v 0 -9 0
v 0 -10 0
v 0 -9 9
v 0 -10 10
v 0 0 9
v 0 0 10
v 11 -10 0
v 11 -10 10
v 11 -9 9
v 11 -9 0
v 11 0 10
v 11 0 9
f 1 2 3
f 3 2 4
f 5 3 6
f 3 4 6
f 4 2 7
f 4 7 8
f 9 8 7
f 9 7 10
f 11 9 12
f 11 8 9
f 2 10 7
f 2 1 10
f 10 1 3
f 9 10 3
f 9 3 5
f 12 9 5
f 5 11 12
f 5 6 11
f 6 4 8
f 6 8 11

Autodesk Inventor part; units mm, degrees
ref_plane "YZ Plane" through (0, 0, 0) normal (1, 0, 0) x (0, 1, 0)
ref_plane "XZ Plane" through (0, 0, 0) normal (0, 1, 0) x (-1, 0, 0)
ref_plane "XY Plane" through (0, 0, 0) normal (0, 0, 1) x (1, 0, 0)
sketch "Sketch1" plane through (0, 0, 0) normal (1, 0, 0) x (0, 1, 0)
  line L0 (0, 0) -> (-10, 0)
  line L1 (-10, 0) -> (-10, 10)
  line L2 (-10, 10) -> (0, 10)
  line L3 (0, 10) -> (0, 0)
  line L4 (-9, 9) -> (0, 9)
  line L5 (0, 9) -> (0, 0)
  line L6 (0, 0) -> (-9, 0)
  line L7 (-9, 0) -> (-9, 9)
  dimension "d0" = 10
  dimension "d1" = 1
extrude "Extrusion1" add sketch "Sketch1" along normal blind 11 contours L0 L1 L2 L3 L4 L7
properties part number "CouplerL" material "Stainless Steel"
